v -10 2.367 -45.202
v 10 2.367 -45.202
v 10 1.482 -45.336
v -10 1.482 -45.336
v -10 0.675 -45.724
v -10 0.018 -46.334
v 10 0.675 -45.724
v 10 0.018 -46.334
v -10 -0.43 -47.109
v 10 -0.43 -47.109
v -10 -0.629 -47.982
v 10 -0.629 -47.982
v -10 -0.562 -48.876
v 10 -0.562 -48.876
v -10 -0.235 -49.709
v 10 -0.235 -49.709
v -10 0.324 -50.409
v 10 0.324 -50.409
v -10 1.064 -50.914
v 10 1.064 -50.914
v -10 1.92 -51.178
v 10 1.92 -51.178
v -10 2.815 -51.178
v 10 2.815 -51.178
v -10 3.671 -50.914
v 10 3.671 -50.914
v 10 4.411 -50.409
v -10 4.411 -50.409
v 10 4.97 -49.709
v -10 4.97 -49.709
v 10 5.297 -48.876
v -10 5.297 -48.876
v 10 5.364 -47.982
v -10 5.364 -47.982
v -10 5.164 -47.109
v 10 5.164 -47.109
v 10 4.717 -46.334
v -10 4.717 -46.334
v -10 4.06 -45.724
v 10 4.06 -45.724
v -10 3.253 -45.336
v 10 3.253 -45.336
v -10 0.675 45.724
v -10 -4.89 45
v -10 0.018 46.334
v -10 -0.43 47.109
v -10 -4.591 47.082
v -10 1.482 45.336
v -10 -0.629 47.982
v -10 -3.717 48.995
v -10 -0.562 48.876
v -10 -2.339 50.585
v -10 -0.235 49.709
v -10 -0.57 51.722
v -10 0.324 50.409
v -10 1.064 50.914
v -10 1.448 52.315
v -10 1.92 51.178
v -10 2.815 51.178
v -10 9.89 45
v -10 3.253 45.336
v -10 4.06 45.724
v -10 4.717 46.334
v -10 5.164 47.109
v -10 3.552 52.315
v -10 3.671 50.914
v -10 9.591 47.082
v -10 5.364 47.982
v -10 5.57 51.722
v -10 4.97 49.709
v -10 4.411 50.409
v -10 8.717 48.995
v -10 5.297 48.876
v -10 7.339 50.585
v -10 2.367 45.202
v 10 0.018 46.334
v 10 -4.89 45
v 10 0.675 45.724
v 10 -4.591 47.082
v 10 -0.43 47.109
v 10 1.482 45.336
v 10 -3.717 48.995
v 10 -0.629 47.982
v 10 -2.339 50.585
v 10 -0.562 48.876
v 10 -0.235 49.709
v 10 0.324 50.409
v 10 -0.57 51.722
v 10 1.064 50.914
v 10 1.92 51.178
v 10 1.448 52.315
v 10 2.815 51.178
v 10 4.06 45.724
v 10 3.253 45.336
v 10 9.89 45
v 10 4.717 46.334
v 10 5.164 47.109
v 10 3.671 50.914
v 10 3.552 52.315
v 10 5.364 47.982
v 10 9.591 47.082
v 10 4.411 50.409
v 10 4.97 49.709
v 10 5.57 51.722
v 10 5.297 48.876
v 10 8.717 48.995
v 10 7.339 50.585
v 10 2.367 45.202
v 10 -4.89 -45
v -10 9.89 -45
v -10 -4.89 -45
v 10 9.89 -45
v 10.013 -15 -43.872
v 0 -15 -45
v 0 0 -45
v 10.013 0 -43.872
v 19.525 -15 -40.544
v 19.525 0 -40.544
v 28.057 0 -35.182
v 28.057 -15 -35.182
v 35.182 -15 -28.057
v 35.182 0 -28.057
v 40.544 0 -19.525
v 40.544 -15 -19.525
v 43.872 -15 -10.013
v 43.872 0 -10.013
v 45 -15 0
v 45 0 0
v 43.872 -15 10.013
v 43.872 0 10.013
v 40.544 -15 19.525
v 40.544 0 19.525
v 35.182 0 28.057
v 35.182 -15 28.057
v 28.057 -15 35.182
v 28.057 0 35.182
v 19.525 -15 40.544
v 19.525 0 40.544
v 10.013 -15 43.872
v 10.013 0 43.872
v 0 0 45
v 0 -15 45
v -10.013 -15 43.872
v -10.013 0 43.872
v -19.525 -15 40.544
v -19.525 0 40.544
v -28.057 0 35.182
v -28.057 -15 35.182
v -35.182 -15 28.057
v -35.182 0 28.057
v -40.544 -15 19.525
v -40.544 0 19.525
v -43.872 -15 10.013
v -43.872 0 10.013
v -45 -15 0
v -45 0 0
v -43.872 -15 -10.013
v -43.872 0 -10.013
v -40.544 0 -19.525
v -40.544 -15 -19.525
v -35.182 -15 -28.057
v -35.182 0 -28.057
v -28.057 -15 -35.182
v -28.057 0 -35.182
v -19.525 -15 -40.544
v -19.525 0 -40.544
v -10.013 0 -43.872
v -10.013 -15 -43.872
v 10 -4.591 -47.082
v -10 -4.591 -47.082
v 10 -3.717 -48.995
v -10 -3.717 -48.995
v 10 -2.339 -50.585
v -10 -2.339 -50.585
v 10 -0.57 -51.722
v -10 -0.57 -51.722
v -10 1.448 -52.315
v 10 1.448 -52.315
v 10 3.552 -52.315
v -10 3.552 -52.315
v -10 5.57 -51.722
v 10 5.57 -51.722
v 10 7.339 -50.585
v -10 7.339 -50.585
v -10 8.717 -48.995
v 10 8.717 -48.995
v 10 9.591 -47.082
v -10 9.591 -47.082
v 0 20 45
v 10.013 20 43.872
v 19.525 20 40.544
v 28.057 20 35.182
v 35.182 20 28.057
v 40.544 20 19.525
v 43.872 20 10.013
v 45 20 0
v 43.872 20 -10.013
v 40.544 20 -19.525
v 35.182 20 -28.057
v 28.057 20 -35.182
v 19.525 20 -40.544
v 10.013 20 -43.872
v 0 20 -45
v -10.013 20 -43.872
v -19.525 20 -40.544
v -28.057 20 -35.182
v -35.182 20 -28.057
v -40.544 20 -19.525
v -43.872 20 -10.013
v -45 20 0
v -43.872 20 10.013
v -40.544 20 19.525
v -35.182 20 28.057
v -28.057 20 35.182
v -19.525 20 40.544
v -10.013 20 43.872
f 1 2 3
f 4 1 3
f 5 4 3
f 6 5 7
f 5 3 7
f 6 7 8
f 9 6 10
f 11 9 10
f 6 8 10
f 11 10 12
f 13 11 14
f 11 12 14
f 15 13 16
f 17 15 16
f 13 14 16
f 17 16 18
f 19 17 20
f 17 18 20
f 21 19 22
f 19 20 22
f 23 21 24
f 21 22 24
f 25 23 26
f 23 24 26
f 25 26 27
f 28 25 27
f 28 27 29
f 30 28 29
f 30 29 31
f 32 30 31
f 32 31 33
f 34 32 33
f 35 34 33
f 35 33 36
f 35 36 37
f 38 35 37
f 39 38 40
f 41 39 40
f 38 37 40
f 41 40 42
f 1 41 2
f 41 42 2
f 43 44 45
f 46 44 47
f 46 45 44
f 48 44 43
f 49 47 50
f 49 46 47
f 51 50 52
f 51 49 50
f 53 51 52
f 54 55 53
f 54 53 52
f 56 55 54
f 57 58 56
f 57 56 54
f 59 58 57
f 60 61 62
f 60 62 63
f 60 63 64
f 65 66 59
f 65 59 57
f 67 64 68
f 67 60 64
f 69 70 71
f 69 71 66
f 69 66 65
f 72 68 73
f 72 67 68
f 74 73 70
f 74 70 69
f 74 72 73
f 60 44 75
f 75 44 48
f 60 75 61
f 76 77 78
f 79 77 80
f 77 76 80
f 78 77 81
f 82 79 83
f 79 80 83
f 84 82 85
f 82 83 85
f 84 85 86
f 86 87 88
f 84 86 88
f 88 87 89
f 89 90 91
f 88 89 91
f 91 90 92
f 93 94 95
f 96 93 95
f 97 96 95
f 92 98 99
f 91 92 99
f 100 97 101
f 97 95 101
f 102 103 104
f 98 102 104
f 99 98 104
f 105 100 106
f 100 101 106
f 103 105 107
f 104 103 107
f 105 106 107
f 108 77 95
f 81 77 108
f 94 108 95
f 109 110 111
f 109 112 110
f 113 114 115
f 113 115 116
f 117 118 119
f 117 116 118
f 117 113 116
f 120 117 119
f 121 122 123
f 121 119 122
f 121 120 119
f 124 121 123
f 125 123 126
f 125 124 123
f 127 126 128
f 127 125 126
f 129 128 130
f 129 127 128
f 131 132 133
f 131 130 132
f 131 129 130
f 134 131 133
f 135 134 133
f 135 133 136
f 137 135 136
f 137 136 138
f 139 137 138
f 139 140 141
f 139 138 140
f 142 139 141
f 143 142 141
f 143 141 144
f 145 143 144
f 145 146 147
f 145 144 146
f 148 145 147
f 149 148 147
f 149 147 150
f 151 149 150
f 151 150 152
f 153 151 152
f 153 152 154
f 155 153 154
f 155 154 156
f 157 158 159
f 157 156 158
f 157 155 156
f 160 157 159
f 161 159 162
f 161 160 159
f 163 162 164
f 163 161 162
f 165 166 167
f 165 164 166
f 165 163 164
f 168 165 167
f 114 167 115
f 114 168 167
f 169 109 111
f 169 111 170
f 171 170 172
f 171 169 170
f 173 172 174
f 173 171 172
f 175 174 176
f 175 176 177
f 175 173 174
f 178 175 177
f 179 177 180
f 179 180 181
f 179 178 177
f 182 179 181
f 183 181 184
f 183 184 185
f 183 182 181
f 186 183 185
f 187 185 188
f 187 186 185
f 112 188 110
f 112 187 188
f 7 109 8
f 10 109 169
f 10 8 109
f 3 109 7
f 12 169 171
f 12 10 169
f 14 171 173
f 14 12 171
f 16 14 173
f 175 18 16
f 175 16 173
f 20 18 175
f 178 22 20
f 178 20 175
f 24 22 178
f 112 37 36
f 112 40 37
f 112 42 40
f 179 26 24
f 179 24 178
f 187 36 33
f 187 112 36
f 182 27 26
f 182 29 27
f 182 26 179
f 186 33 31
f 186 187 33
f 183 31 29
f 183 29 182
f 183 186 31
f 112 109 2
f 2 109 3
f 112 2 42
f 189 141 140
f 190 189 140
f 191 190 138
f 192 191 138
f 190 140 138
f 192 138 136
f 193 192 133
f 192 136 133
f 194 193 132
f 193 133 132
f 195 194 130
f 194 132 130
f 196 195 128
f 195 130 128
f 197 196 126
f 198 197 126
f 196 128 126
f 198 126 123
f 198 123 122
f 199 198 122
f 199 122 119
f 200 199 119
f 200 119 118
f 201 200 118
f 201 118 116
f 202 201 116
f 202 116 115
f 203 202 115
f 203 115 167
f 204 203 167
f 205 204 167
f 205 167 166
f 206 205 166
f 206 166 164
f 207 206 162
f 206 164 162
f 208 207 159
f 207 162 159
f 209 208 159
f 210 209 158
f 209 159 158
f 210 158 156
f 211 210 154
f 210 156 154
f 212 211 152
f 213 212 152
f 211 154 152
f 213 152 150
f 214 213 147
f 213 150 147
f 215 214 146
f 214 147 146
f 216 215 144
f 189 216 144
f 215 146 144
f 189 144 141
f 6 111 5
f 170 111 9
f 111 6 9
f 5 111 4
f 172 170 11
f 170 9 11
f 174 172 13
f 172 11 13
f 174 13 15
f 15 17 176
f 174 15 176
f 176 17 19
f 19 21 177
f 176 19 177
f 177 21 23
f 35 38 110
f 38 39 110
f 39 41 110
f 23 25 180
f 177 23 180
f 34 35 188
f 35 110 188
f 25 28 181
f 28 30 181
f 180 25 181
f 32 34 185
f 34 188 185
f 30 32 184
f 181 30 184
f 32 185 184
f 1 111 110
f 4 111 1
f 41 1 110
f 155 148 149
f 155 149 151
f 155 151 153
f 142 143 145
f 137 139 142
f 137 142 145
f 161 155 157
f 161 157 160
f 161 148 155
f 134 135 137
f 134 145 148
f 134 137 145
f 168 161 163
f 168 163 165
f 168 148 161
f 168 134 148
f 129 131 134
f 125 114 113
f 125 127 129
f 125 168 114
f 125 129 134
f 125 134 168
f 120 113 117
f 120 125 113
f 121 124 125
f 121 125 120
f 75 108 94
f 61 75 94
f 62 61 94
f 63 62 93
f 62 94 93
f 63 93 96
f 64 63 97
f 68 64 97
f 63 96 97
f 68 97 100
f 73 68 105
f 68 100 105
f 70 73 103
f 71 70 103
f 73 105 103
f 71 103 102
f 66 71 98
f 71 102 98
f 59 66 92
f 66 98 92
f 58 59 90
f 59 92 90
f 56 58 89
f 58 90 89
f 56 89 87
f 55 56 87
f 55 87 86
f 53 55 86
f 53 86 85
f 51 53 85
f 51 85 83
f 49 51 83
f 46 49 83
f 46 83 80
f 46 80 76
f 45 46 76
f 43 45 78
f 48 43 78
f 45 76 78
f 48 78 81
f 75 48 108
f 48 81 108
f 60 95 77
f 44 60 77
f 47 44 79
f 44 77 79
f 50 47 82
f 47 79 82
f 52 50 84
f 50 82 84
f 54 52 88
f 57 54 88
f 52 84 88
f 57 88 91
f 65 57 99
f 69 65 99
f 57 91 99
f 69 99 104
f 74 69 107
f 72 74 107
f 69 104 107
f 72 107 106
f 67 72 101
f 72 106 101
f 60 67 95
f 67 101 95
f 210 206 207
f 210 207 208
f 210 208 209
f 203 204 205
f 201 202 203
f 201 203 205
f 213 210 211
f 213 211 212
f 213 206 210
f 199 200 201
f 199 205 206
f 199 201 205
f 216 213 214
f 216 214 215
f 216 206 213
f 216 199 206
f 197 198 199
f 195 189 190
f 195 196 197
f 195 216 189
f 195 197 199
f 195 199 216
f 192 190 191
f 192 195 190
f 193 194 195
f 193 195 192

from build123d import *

# Parameters (mm, degrees)
SKETCH1_R             = 45
BOSS_EXTRUDE1_DEPTH   = 20
BOSS_EXTRUDE3_START   = 15
SKETCH9_R             = 45
BOSS_EXTRUDE3_DEPTH   = 15
BOSS_EXTRUDE4_DEPTH   = 10
BOSS_EXTRUDE4_2_DEPTH = 10
SKETCH11_R            = 3.004647084
CUT_EXTRUDE1_DEPTH    = 20


with BuildPart() as part:
    # Sketch1 → Boss-Extrude1 (new body)
    with BuildSketch(Plane(origin=(0, 0, 0), x_dir=(1, 0, 0), z_dir=(0, 1, 0))):
        with Locations(Location((0, 0, 0), (0, 0, 270))):
            Circle(SKETCH1_R)
    extrude(amount=BOSS_EXTRUDE1_DEPTH)

    # Sketch9 → Boss-Extrude3 (add)
    with BuildSketch(Plane.XZ.offset(BOSS_EXTRUDE3_START)):
        with Locations(Location((0, 0, 0), (0, 0, 270))):
            Circle(SKETCH9_R)
    extrude(amount=-BOSS_EXTRUDE3_DEPTH)


with BuildPart() as body_2:
    # Sketch10 → Boss-Extrude4 (new, symmetric)
    with BuildSketch(Plane(origin=(0, 0, 0), x_dir=(0, 0, -1), z_dir=(1, 0, 0))):
        with BuildLine():
            Line((45, 9.890090122), (45, -4.890090122))
            ThreePointArc((45, -4.890090122), (52.390090122, 2.5), (45, 9.890090122))
        make_face()
    extrude(amount=BOSS_EXTRUDE4_DEPTH, both=True)


with BuildPart() as body_3:
    # Sketch10 → Boss-Extrude4 2 (new, symmetric)
    with BuildSketch(Plane(origin=(0, 0, 0), x_dir=(0, 0, -1), z_dir=(1, 0, 0))):
        with BuildLine():
            Line((-45, 9.890090122), (-45, -4.890090122))
            ThreePointArc((-45, -4.890090122), (-52.390090122, 2.5), (-45, 9.890090122))
        make_face()
    extrude(amount=BOSS_EXTRUDE4_2_DEPTH, both=True)


with BuildPart() as cut_extrude1_tool:
    # Sketch11 → Cut-Extrude1 (new body)
    with BuildSketch(Plane(origin=(10, 0, 0), x_dir=(0, 0, -1), z_dir=(1, 0, 0))):
        with Locations((-48.206917235, 2.367401044)):
            Circle(SKETCH11_R)
        with Locations(Location((48.206917235, 2.367401044, 0), (0, 0, 180))):
            Circle(SKETCH11_R)
    extrude(amount=-CUT_EXTRUDE1_DEPTH)


with BuildPart() as body_2_1:
    add(body_2.part)

    # Cut-Extrude1: cut by cut_extrude1_tool
    add(cut_extrude1_tool.part, mode=Mode.SUBTRACT)


with BuildPart() as body_3_1:
    add(body_3.part)

    # Cut-Extrude1: cut by cut_extrude1_tool
    add(cut_extrude1_tool.part, mode=Mode.SUBTRACT)


solid = Compound([part.part, body_2_1.part, body_3_1.part])
